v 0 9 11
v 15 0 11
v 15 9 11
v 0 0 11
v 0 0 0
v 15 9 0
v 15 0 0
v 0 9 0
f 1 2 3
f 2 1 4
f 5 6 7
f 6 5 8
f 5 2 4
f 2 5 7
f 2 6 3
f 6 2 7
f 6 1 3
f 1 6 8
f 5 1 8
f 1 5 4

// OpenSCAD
// Generated by SolidPython 1.0.1 on 2020-07-29 00:46:55


cube(size = [15, 9, 11]);
/***********************************************
*********      SolidPython code:      **********
************************************************
 
# import packages: SolidPython
from solid import *
from solid.utils import *
from itertools import chain, combinations, permutations


class Resize:

    def __init__(self, scad_file):
        self.scad_file = scad_file
        #self.scad_file = import_scad(scad_file)
        # cone/cylinder param:
        self.r1 = 0
        self.r2 = 0
        self.h = 0
        # rectangular prism param:
        self.w = 0
        self.l = 0
        # ellipse param:
        self.r = 0

    # import OpenScad code (file name corresponds to shape)


    # classify shape + parameters
    def assign(self, param1, param2, param3):
        if self.scad_file == 'cone.scad':
            self.r1 = param1
            self.r2 = param2
            self.h = param3
        elif self.scad_file == 'cylinder.scad':
            self.r1 = param1
            self.r2 = param2
            self.h = param3
        elif self.scad_file == 'rectangularPrism.scad':
            self.h = param1
            self.l = param2
            self.w = param3
        else:
            self.r = param1
            self.h = param2

    # resize parameters
    def iterate(self):
        x = range(3, 20, 2)
        i = 1
        if self.scad_file == 'cone.scad':
            tempList = list(permutations(x, 2))
            for temp in tempList:
                param1 = temp[0]
                param2 = temp[1]
                filepath = 'produced_scad_files/' + 'cone' + str(param1) + '_' + str(param2) + '_' + '.scad'
                scad_render_to_file(cylinder(h=param1, r1=param2, r2=0), filepath)

        elif self.scad_file == 'cylinder.scad':
            tempList = list(permutations(x, 3))
            for temp in tempList:
                param1 = temp[0]
                param2 = temp[1]
                filepath = 'produced_scad_files/' + 'cylinder' + str(param1) + '_' + str(param2) + '_' + '.scad'
                scad_render_to_file(cylinder(h=param1, r1=param2, r2=param2), filepath)

        elif self.scad_file == 'rectangularPrism.scad':
            tempList = list(permutations(x, 3))
            for temp in tempList:
                param1 = temp[0]
                param2 = temp[1]
                param3 = temp[2]
                filepath = 'produced_scad_files/' + 'rectangularPrism' + str(param1) + '_' + str(param2) + '_' + str(
                    param3) + '.scad'
                scad_render_to_file(cube(size=(param1, param2, param3)), filepath)

        elif self.scad_file == 'ellipse.scad':
            tempList = list(permutations(x, 4))
            for temp in tempList:
                param1 = temp[0]
                param2 = temp[1]
                param3 = temp[2]
                param4 = temp[3]
                filepath = 'produced_scad_files/' + 'ellipse' + str(param1) + '_' + str(param2) + '_' + str(param3) + '_' + str(param4) + '.scad'
                scad_render_to_file(scale([param1, param2, param3])(sphere(r=param4)), filepath)

    def render_to_scadfile(self):
        scad_render_to_file(scad, 'example.scad') 
 
************************************************/
